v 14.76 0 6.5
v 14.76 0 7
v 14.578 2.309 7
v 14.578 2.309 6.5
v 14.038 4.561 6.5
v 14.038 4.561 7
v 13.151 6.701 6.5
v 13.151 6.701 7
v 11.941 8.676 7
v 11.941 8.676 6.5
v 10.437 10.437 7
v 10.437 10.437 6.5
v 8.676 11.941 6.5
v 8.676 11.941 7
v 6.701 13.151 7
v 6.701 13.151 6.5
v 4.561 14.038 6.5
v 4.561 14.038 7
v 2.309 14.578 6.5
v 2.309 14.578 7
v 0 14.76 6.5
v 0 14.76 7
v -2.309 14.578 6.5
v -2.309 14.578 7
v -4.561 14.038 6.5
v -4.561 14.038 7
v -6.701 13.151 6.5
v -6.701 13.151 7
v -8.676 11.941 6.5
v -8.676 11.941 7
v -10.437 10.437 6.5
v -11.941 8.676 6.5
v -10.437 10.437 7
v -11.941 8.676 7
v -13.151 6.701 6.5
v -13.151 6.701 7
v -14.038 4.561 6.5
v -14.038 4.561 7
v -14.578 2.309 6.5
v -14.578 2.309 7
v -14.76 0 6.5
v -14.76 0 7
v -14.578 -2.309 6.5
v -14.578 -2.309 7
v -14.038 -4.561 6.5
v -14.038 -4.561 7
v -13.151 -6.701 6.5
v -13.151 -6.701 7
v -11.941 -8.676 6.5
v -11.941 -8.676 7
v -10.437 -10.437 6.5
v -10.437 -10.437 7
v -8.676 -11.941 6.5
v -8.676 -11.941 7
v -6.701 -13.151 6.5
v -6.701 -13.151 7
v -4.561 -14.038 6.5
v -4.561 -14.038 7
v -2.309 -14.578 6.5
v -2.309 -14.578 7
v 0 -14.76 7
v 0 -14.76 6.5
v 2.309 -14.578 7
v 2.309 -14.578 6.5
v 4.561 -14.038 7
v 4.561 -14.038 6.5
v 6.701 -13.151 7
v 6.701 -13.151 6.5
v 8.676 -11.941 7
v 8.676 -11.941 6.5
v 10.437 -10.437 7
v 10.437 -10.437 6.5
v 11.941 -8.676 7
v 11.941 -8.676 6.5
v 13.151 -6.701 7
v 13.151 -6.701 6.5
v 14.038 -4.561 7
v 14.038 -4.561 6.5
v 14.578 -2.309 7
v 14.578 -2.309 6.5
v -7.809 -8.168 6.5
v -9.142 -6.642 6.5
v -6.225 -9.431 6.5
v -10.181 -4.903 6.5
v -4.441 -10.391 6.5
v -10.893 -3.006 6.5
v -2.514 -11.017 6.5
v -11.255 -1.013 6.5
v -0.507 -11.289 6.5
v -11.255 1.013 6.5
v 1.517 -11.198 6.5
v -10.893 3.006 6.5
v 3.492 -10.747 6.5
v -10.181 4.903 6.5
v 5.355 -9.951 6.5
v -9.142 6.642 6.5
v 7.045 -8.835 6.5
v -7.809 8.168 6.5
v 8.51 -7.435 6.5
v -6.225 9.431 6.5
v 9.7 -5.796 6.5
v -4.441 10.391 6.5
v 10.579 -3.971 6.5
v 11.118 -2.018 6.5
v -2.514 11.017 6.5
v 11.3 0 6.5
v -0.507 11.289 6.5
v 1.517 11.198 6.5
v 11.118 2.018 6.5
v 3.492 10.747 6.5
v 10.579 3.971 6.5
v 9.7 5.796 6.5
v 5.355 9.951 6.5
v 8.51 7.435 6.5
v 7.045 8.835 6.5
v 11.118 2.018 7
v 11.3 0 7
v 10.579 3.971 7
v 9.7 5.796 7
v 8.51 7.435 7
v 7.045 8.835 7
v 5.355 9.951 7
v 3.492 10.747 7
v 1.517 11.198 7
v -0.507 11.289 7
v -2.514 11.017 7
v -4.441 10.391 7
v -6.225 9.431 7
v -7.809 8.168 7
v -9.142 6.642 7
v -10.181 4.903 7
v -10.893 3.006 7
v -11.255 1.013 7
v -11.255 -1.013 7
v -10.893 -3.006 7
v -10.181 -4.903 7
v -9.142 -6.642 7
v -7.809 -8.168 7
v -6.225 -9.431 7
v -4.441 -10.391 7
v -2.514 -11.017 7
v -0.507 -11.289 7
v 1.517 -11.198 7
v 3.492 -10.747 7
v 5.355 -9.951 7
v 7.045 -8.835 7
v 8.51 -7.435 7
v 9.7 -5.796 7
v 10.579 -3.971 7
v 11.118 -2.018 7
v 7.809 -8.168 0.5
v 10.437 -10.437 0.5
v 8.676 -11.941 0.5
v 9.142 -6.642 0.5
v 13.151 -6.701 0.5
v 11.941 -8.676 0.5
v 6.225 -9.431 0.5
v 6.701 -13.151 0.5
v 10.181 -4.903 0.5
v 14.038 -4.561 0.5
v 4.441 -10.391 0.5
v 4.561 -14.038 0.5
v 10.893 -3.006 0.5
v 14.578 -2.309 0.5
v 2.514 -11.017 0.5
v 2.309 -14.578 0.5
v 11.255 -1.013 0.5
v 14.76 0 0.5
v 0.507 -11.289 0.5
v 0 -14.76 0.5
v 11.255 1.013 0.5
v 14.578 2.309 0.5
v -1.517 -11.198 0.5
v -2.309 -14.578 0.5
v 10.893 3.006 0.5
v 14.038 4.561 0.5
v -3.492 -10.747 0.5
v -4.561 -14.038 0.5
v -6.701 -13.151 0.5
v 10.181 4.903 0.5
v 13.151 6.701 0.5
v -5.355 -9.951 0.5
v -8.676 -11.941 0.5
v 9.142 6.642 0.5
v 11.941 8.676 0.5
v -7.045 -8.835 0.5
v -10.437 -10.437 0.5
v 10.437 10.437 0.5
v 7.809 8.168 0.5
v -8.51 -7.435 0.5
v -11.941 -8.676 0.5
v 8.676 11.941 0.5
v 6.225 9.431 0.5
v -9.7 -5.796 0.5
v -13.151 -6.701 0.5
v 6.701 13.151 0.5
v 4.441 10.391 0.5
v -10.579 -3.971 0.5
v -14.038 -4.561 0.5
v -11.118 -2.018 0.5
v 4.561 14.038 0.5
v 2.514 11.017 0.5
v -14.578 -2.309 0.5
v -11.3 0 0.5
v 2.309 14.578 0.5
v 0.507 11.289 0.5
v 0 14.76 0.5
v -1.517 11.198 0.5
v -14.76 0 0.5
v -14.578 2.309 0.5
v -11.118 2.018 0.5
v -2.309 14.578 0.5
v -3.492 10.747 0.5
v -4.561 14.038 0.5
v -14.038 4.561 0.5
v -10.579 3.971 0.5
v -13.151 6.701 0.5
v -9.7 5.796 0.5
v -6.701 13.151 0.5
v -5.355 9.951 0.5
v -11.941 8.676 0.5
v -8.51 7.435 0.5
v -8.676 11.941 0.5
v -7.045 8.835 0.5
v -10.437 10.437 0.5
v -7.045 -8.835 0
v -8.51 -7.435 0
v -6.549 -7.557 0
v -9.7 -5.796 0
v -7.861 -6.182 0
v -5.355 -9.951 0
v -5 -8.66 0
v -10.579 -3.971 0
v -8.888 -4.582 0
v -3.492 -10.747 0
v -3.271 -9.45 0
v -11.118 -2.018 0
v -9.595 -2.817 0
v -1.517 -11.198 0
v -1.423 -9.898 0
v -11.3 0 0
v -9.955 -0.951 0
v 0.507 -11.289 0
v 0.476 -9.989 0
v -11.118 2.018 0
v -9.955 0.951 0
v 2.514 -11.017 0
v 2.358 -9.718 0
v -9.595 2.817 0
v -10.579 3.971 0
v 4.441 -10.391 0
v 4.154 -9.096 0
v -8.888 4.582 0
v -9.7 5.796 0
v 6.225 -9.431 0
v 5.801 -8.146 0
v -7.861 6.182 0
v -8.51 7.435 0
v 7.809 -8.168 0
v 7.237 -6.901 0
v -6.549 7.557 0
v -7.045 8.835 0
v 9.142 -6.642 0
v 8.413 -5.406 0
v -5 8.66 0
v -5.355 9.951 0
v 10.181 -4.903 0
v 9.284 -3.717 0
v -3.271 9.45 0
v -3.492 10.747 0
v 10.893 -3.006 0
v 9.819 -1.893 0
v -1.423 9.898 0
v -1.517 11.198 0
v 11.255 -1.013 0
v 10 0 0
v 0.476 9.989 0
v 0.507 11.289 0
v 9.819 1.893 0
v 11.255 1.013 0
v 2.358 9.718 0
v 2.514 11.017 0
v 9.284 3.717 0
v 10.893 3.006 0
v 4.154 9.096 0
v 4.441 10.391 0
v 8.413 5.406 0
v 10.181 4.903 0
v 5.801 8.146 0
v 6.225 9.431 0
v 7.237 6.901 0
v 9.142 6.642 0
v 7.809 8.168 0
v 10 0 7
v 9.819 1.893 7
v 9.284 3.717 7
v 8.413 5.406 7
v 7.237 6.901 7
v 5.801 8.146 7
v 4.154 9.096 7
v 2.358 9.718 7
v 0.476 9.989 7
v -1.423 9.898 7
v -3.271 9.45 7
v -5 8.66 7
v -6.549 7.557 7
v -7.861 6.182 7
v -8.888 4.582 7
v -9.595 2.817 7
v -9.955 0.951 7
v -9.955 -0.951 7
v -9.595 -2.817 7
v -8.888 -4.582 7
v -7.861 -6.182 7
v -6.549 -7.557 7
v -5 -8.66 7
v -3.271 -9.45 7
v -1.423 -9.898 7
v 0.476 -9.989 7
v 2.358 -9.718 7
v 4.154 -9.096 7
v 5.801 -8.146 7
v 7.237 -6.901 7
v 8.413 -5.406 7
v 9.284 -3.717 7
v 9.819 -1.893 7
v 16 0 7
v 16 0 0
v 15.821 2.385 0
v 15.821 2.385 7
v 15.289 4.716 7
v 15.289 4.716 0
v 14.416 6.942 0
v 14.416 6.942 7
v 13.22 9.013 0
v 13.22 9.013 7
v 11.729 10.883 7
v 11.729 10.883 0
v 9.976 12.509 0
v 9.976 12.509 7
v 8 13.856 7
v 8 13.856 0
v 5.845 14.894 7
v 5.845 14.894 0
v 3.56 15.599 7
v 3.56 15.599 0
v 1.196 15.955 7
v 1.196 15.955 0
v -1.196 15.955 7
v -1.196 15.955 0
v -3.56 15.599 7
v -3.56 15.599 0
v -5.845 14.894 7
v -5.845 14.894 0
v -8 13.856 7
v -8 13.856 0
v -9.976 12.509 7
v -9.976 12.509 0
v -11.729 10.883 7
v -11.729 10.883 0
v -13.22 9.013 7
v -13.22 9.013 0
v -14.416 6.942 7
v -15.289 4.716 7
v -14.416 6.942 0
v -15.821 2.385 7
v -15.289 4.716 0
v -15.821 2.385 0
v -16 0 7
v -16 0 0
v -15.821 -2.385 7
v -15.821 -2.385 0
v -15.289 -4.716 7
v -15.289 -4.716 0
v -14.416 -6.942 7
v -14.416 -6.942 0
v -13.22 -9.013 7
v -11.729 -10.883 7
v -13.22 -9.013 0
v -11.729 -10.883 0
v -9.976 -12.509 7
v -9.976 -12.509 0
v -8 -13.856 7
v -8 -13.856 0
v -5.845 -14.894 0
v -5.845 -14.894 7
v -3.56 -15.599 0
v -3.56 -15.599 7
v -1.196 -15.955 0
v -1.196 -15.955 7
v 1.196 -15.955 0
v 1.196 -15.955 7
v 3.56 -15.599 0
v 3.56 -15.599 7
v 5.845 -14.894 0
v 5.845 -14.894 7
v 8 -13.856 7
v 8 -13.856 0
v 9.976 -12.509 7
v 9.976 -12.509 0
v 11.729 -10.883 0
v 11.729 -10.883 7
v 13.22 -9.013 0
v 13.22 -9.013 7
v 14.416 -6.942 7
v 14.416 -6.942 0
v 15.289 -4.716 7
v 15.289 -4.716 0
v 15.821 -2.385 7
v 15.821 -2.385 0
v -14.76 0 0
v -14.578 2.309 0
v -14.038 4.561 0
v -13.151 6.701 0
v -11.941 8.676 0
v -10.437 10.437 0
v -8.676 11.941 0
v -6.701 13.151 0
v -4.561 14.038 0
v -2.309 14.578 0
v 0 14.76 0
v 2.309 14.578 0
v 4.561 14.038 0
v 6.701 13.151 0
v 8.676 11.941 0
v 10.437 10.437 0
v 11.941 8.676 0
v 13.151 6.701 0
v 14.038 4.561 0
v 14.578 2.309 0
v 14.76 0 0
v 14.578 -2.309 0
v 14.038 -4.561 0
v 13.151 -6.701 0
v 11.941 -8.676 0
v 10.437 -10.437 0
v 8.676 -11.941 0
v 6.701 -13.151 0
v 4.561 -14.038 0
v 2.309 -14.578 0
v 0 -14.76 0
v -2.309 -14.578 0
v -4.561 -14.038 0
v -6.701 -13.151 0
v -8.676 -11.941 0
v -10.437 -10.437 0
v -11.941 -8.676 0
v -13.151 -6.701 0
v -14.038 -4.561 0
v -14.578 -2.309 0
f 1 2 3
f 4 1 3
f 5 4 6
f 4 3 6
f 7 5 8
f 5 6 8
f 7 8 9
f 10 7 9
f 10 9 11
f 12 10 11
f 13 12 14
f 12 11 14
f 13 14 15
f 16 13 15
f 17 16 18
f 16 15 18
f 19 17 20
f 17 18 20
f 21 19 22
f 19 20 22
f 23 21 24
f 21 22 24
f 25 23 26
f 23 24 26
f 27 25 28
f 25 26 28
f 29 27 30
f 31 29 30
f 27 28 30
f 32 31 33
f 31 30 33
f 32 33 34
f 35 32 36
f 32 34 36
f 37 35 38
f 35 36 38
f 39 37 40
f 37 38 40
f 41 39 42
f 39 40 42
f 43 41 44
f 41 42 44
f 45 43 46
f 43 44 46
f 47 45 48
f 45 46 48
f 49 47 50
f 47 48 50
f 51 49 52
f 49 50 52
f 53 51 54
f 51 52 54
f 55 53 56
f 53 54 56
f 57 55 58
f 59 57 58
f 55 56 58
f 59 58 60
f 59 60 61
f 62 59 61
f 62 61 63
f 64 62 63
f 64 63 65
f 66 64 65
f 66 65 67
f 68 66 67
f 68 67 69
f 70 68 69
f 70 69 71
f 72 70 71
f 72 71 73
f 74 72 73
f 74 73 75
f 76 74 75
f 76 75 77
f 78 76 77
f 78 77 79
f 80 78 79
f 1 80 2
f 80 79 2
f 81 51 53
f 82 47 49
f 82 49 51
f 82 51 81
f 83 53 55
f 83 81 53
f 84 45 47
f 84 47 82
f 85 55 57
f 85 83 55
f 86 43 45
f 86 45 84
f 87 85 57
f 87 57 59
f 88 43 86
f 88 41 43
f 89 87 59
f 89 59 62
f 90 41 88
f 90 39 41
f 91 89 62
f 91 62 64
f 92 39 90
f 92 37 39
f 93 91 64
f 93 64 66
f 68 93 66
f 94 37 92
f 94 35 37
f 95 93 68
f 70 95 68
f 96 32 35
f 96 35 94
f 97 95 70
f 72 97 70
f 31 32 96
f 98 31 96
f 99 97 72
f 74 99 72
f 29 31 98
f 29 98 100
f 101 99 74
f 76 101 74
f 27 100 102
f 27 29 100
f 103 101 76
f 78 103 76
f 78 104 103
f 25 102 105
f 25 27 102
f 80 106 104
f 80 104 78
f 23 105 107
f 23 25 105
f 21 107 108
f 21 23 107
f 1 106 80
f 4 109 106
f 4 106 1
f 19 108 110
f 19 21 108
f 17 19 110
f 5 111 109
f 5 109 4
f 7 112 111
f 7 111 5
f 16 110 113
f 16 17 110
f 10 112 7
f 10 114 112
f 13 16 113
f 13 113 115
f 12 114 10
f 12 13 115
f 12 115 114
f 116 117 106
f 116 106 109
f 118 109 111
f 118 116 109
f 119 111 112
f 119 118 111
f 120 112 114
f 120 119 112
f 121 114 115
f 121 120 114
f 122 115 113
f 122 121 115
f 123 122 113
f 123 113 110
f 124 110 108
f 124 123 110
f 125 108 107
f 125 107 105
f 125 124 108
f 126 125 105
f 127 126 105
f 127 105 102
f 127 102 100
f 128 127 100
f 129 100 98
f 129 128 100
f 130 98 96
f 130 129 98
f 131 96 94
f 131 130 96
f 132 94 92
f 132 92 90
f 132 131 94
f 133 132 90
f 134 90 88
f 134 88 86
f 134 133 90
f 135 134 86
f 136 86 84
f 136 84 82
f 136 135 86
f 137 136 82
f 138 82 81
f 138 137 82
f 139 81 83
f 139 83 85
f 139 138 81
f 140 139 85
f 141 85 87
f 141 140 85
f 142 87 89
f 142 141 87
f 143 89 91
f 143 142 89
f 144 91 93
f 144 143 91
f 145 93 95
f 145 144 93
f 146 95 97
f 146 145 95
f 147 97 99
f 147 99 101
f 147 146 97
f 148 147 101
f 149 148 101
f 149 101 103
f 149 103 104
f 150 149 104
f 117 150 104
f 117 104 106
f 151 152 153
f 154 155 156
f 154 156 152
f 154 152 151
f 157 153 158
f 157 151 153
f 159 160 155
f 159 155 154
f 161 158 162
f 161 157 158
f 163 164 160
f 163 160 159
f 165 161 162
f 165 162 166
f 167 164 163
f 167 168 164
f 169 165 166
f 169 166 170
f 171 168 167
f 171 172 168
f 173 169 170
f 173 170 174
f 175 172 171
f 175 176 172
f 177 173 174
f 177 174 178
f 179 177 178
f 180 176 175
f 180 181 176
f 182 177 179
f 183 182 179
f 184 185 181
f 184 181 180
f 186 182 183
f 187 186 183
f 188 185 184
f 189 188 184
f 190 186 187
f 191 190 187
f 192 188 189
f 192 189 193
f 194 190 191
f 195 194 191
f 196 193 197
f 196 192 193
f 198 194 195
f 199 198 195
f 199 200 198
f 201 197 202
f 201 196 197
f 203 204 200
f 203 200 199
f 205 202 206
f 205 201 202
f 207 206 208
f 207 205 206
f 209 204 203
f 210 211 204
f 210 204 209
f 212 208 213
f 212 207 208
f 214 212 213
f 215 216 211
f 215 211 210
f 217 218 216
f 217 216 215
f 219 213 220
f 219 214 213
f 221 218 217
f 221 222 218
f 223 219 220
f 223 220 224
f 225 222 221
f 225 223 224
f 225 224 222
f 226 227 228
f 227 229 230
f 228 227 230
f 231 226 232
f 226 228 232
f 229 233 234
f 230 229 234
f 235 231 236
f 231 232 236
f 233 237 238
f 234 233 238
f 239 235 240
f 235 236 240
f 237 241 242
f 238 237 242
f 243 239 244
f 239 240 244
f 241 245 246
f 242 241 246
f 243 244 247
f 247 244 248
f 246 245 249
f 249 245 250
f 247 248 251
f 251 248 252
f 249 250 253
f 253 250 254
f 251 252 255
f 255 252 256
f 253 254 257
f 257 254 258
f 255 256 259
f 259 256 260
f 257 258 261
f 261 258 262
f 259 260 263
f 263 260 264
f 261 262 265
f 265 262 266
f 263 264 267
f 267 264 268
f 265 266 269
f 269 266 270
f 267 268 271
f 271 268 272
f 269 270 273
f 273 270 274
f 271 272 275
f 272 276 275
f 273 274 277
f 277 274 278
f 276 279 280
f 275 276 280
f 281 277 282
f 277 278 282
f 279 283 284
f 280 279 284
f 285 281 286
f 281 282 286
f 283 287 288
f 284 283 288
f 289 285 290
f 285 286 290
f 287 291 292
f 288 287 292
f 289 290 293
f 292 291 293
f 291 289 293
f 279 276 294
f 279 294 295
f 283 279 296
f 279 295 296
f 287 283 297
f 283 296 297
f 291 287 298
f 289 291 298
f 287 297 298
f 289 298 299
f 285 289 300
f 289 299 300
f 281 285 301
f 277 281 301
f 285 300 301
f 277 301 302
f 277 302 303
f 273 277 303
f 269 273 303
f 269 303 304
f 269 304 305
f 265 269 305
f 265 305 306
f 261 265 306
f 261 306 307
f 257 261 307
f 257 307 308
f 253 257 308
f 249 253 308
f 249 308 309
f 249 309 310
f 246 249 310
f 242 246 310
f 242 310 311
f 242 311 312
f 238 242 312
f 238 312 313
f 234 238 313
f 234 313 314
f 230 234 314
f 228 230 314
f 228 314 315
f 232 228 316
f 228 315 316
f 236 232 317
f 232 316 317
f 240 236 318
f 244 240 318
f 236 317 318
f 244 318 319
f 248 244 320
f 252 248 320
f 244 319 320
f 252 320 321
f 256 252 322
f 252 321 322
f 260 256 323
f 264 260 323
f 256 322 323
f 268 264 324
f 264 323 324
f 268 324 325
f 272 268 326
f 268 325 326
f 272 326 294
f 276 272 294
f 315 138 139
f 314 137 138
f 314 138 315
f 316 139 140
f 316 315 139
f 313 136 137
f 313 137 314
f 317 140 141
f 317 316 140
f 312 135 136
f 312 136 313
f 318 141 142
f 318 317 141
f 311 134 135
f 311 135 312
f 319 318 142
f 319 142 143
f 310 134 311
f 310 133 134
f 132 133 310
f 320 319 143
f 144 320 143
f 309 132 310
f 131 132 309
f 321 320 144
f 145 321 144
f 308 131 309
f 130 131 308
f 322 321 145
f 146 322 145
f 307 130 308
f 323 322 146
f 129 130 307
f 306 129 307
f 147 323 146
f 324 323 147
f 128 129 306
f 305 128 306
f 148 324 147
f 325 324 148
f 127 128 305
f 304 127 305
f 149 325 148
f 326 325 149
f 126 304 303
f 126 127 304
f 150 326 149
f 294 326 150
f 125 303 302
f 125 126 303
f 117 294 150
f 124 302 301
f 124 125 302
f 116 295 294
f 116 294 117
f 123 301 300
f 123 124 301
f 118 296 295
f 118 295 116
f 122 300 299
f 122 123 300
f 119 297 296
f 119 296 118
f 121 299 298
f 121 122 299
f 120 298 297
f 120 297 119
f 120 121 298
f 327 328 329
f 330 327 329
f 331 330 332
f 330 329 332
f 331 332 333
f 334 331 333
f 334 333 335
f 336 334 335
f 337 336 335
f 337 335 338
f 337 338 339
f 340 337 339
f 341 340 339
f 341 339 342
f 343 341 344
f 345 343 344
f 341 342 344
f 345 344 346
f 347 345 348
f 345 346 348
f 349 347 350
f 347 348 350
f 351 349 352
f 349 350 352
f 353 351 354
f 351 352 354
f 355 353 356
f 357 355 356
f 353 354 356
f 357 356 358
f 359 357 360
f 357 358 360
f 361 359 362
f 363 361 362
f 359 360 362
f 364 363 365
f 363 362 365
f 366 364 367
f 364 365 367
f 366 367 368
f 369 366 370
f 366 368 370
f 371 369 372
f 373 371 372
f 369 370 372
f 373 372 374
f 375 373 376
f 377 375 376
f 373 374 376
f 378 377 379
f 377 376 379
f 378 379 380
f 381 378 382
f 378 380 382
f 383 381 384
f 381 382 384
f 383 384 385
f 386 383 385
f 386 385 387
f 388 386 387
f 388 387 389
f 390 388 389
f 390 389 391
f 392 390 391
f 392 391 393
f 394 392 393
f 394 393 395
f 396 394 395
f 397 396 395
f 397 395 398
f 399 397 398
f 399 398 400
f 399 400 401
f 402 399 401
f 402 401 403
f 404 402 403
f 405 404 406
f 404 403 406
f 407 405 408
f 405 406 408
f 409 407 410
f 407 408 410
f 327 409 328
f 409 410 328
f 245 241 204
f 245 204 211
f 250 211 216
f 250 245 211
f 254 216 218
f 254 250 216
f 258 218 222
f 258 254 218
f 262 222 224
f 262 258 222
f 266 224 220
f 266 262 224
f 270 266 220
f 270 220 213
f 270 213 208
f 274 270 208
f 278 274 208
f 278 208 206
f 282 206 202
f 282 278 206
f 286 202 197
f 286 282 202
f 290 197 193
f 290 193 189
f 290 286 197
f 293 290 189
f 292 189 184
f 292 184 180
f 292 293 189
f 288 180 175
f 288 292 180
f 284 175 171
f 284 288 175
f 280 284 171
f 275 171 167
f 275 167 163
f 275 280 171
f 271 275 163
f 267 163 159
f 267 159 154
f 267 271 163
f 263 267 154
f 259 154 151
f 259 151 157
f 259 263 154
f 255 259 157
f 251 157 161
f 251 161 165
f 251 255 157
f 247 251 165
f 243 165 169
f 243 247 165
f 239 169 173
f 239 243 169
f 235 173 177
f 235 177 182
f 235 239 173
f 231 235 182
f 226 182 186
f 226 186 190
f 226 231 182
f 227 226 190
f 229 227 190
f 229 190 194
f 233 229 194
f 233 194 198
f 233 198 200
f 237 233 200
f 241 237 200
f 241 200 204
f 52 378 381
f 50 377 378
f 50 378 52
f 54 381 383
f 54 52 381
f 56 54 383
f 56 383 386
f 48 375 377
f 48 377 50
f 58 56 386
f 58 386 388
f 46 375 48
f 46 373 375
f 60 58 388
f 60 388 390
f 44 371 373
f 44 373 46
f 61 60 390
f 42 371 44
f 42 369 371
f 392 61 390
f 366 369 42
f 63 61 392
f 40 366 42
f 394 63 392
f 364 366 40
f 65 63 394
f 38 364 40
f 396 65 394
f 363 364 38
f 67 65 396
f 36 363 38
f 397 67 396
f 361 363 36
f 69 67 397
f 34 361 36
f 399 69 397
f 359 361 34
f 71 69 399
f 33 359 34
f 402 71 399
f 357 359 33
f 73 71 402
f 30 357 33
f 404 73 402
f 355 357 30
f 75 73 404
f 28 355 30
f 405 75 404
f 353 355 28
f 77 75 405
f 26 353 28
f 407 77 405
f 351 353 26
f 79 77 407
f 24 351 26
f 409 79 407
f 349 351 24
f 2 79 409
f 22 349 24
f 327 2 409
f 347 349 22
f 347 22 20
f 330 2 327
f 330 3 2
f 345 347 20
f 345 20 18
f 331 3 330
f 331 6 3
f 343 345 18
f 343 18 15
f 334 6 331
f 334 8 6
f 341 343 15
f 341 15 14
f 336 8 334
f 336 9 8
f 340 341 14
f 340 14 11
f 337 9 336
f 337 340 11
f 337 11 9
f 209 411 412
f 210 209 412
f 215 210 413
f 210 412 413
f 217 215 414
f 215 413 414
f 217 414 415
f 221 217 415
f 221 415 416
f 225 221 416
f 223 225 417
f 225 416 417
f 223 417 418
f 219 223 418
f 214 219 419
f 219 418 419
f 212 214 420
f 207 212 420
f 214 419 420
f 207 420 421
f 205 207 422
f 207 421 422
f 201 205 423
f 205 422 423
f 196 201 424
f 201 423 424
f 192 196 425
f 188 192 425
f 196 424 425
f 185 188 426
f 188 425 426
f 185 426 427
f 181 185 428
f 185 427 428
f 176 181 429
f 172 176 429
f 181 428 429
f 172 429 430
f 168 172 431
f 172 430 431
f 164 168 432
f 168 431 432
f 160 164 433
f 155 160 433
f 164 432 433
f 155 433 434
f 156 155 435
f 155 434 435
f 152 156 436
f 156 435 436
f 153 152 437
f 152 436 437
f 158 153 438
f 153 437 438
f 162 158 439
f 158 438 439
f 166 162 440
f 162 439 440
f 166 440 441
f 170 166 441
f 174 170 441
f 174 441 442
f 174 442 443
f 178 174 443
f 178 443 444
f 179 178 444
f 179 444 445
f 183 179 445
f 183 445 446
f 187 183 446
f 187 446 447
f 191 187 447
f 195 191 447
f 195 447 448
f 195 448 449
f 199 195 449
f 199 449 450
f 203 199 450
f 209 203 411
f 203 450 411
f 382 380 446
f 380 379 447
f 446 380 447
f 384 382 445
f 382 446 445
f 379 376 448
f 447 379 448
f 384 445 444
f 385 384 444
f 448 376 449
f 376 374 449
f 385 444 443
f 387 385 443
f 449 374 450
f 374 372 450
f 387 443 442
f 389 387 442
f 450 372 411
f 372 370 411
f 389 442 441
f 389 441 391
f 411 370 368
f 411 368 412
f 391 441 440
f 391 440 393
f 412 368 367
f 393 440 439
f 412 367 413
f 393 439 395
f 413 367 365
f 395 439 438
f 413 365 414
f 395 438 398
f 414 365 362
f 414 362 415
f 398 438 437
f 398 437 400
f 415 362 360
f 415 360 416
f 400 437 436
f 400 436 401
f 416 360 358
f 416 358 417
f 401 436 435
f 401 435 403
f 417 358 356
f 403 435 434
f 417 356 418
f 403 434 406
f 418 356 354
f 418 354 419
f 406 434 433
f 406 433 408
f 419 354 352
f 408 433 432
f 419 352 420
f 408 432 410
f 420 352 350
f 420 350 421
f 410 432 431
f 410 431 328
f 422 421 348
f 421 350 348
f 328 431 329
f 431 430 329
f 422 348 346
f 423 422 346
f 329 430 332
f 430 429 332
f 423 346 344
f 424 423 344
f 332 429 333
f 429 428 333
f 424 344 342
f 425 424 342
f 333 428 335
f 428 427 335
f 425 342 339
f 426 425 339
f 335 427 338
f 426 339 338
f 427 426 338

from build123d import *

# Parameters (mm, degrees)
SKETCH_1_R          = 16
EXTRUDE_1_DEPTH     = 7
SKETCH_2_R          = 10
CUT_EXTRUDE_1_DEPTH = 8
SKETCH_3_R          = 14.76
SKETCH_3_R_2        = 11.3
CUT_EXTRUDE_2_DEPTH = 0.5
SKETCH_4_R          = 14.76
SKETCH_4_R_2        = 11.3
CUT_EXTRUDE_3_DEPTH = 0.5


with BuildPart() as part:
    # 草圖1 → 填料-伸長1 (new body)
    with BuildSketch(Plane.XY):
        Circle(SKETCH_1_R)
    extrude(amount=EXTRUDE_1_DEPTH)

    # 草圖2 → 除料-伸長1 (cut, through all)
    with BuildSketch(Plane.XY.offset(7)):
        Circle(SKETCH_2_R)
    extrude(amount=-CUT_EXTRUDE_1_DEPTH, mode=Mode.SUBTRACT)

    # 草圖3 → 除料-伸長2 (cut)
    with BuildSketch(Plane.XY.offset(7)):
        Circle(SKETCH_3_R)
        Circle(SKETCH_3_R_2, mode=Mode.SUBTRACT)
    extrude(amount=-CUT_EXTRUDE_2_DEPTH, mode=Mode.SUBTRACT)

    # 草圖4 → 除料-伸長3 (cut)
    with BuildSketch(Plane(origin=(0, 0, 0), x_dir=(-1, 0, 0), z_dir=(0, 0, -1))):
        Circle(SKETCH_4_R)
        Circle(SKETCH_4_R_2, mode=Mode.SUBTRACT)
    extrude(amount=-CUT_EXTRUDE_3_DEPTH, mode=Mode.SUBTRACT)


solid = part.part
